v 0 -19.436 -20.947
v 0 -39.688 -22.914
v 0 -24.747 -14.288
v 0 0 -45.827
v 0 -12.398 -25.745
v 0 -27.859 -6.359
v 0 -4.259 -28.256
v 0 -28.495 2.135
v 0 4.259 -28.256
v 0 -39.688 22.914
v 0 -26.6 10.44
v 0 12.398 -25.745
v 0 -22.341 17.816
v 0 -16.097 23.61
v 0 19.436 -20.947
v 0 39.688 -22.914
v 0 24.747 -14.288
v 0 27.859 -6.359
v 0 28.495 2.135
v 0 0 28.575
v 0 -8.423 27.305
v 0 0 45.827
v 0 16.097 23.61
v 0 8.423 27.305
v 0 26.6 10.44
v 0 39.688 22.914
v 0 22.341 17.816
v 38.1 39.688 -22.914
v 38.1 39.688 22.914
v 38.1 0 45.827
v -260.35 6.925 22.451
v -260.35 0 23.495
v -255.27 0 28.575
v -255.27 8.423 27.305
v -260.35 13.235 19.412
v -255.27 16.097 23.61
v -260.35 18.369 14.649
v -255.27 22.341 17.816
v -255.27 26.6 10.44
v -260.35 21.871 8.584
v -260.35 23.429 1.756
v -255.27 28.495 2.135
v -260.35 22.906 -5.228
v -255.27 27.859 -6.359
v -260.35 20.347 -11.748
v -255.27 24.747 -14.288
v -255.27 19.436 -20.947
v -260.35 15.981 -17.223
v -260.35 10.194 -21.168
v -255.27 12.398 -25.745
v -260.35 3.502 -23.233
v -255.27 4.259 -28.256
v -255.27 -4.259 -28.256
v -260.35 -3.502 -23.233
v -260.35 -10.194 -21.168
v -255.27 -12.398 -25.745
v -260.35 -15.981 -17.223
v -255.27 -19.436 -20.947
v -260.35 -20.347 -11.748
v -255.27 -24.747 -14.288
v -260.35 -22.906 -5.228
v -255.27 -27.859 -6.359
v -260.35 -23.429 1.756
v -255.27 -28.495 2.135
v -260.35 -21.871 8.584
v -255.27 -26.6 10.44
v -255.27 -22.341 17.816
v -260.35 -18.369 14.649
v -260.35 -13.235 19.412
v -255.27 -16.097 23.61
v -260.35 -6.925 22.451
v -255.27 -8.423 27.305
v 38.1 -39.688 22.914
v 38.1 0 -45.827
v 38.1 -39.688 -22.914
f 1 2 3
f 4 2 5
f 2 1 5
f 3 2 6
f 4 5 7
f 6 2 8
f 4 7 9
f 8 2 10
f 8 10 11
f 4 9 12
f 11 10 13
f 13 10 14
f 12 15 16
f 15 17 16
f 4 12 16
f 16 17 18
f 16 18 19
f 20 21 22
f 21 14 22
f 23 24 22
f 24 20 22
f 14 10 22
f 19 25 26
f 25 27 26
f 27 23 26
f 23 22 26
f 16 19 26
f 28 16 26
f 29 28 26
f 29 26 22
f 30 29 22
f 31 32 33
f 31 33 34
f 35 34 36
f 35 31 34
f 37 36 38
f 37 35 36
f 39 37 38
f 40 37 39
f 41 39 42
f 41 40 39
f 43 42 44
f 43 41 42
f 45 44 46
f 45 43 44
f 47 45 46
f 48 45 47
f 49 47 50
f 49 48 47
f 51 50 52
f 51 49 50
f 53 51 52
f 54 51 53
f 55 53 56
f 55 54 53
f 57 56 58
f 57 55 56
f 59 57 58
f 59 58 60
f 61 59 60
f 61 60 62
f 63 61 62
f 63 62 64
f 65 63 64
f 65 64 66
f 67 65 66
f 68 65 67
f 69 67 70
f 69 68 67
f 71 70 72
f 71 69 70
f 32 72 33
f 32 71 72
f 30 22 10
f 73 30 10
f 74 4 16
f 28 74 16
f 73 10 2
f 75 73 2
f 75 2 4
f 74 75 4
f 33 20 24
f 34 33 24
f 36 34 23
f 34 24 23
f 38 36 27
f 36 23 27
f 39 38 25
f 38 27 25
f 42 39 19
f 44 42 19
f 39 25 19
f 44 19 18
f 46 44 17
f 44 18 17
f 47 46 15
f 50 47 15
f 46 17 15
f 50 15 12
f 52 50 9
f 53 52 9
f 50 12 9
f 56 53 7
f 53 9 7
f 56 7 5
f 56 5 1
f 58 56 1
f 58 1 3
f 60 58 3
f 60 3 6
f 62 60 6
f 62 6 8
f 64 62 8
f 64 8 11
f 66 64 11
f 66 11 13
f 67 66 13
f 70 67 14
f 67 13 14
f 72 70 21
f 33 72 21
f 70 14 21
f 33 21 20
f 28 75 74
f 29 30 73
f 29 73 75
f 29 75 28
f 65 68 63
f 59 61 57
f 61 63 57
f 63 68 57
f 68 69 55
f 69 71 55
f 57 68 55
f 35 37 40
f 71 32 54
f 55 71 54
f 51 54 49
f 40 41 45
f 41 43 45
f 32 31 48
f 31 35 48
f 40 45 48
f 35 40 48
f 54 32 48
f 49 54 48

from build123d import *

# Parameters (mm, degrees)
F0_W      = 260.35
F0_H      = 28.575
F1_FACE_R = 28.575
F3_DEPTH  = 38.1
F4_SIZE   = 5.08


with BuildPart() as f1:
    # F0 (on Front) → F1 (revolve)
    with BuildSketch(Plane.XZ):
        with Locations((-130.175, 14.2875)):
            Rectangle(F0_W, F0_H)
    revolve(axis=Axis((-130.175, 0, 0), (-1, 0, 0)))

    # F2 (on Right) + F1_face (on face) → F3 (join)
    with BuildSketch(Plane.YZ):
        Polygon((-39.6875, -22.913589), (0, -45.827178), (39.6875, -22.913589), (39.6875, 22.913589), (0, 45.827178), (-39.6875, 22.913589), align=None)
    with BuildSketch(Plane.YZ):
        Circle(F1_FACE_R)
    extrude(amount=F3_DEPTH)

    # F4
    f4_edges = [f1.edges().sort_by_distance(p)[0] for p in [
        (-260.35, 0, -28.575),
    ]]
    chamfer(f4_edges, length=F4_SIZE)


solid = f1.part
